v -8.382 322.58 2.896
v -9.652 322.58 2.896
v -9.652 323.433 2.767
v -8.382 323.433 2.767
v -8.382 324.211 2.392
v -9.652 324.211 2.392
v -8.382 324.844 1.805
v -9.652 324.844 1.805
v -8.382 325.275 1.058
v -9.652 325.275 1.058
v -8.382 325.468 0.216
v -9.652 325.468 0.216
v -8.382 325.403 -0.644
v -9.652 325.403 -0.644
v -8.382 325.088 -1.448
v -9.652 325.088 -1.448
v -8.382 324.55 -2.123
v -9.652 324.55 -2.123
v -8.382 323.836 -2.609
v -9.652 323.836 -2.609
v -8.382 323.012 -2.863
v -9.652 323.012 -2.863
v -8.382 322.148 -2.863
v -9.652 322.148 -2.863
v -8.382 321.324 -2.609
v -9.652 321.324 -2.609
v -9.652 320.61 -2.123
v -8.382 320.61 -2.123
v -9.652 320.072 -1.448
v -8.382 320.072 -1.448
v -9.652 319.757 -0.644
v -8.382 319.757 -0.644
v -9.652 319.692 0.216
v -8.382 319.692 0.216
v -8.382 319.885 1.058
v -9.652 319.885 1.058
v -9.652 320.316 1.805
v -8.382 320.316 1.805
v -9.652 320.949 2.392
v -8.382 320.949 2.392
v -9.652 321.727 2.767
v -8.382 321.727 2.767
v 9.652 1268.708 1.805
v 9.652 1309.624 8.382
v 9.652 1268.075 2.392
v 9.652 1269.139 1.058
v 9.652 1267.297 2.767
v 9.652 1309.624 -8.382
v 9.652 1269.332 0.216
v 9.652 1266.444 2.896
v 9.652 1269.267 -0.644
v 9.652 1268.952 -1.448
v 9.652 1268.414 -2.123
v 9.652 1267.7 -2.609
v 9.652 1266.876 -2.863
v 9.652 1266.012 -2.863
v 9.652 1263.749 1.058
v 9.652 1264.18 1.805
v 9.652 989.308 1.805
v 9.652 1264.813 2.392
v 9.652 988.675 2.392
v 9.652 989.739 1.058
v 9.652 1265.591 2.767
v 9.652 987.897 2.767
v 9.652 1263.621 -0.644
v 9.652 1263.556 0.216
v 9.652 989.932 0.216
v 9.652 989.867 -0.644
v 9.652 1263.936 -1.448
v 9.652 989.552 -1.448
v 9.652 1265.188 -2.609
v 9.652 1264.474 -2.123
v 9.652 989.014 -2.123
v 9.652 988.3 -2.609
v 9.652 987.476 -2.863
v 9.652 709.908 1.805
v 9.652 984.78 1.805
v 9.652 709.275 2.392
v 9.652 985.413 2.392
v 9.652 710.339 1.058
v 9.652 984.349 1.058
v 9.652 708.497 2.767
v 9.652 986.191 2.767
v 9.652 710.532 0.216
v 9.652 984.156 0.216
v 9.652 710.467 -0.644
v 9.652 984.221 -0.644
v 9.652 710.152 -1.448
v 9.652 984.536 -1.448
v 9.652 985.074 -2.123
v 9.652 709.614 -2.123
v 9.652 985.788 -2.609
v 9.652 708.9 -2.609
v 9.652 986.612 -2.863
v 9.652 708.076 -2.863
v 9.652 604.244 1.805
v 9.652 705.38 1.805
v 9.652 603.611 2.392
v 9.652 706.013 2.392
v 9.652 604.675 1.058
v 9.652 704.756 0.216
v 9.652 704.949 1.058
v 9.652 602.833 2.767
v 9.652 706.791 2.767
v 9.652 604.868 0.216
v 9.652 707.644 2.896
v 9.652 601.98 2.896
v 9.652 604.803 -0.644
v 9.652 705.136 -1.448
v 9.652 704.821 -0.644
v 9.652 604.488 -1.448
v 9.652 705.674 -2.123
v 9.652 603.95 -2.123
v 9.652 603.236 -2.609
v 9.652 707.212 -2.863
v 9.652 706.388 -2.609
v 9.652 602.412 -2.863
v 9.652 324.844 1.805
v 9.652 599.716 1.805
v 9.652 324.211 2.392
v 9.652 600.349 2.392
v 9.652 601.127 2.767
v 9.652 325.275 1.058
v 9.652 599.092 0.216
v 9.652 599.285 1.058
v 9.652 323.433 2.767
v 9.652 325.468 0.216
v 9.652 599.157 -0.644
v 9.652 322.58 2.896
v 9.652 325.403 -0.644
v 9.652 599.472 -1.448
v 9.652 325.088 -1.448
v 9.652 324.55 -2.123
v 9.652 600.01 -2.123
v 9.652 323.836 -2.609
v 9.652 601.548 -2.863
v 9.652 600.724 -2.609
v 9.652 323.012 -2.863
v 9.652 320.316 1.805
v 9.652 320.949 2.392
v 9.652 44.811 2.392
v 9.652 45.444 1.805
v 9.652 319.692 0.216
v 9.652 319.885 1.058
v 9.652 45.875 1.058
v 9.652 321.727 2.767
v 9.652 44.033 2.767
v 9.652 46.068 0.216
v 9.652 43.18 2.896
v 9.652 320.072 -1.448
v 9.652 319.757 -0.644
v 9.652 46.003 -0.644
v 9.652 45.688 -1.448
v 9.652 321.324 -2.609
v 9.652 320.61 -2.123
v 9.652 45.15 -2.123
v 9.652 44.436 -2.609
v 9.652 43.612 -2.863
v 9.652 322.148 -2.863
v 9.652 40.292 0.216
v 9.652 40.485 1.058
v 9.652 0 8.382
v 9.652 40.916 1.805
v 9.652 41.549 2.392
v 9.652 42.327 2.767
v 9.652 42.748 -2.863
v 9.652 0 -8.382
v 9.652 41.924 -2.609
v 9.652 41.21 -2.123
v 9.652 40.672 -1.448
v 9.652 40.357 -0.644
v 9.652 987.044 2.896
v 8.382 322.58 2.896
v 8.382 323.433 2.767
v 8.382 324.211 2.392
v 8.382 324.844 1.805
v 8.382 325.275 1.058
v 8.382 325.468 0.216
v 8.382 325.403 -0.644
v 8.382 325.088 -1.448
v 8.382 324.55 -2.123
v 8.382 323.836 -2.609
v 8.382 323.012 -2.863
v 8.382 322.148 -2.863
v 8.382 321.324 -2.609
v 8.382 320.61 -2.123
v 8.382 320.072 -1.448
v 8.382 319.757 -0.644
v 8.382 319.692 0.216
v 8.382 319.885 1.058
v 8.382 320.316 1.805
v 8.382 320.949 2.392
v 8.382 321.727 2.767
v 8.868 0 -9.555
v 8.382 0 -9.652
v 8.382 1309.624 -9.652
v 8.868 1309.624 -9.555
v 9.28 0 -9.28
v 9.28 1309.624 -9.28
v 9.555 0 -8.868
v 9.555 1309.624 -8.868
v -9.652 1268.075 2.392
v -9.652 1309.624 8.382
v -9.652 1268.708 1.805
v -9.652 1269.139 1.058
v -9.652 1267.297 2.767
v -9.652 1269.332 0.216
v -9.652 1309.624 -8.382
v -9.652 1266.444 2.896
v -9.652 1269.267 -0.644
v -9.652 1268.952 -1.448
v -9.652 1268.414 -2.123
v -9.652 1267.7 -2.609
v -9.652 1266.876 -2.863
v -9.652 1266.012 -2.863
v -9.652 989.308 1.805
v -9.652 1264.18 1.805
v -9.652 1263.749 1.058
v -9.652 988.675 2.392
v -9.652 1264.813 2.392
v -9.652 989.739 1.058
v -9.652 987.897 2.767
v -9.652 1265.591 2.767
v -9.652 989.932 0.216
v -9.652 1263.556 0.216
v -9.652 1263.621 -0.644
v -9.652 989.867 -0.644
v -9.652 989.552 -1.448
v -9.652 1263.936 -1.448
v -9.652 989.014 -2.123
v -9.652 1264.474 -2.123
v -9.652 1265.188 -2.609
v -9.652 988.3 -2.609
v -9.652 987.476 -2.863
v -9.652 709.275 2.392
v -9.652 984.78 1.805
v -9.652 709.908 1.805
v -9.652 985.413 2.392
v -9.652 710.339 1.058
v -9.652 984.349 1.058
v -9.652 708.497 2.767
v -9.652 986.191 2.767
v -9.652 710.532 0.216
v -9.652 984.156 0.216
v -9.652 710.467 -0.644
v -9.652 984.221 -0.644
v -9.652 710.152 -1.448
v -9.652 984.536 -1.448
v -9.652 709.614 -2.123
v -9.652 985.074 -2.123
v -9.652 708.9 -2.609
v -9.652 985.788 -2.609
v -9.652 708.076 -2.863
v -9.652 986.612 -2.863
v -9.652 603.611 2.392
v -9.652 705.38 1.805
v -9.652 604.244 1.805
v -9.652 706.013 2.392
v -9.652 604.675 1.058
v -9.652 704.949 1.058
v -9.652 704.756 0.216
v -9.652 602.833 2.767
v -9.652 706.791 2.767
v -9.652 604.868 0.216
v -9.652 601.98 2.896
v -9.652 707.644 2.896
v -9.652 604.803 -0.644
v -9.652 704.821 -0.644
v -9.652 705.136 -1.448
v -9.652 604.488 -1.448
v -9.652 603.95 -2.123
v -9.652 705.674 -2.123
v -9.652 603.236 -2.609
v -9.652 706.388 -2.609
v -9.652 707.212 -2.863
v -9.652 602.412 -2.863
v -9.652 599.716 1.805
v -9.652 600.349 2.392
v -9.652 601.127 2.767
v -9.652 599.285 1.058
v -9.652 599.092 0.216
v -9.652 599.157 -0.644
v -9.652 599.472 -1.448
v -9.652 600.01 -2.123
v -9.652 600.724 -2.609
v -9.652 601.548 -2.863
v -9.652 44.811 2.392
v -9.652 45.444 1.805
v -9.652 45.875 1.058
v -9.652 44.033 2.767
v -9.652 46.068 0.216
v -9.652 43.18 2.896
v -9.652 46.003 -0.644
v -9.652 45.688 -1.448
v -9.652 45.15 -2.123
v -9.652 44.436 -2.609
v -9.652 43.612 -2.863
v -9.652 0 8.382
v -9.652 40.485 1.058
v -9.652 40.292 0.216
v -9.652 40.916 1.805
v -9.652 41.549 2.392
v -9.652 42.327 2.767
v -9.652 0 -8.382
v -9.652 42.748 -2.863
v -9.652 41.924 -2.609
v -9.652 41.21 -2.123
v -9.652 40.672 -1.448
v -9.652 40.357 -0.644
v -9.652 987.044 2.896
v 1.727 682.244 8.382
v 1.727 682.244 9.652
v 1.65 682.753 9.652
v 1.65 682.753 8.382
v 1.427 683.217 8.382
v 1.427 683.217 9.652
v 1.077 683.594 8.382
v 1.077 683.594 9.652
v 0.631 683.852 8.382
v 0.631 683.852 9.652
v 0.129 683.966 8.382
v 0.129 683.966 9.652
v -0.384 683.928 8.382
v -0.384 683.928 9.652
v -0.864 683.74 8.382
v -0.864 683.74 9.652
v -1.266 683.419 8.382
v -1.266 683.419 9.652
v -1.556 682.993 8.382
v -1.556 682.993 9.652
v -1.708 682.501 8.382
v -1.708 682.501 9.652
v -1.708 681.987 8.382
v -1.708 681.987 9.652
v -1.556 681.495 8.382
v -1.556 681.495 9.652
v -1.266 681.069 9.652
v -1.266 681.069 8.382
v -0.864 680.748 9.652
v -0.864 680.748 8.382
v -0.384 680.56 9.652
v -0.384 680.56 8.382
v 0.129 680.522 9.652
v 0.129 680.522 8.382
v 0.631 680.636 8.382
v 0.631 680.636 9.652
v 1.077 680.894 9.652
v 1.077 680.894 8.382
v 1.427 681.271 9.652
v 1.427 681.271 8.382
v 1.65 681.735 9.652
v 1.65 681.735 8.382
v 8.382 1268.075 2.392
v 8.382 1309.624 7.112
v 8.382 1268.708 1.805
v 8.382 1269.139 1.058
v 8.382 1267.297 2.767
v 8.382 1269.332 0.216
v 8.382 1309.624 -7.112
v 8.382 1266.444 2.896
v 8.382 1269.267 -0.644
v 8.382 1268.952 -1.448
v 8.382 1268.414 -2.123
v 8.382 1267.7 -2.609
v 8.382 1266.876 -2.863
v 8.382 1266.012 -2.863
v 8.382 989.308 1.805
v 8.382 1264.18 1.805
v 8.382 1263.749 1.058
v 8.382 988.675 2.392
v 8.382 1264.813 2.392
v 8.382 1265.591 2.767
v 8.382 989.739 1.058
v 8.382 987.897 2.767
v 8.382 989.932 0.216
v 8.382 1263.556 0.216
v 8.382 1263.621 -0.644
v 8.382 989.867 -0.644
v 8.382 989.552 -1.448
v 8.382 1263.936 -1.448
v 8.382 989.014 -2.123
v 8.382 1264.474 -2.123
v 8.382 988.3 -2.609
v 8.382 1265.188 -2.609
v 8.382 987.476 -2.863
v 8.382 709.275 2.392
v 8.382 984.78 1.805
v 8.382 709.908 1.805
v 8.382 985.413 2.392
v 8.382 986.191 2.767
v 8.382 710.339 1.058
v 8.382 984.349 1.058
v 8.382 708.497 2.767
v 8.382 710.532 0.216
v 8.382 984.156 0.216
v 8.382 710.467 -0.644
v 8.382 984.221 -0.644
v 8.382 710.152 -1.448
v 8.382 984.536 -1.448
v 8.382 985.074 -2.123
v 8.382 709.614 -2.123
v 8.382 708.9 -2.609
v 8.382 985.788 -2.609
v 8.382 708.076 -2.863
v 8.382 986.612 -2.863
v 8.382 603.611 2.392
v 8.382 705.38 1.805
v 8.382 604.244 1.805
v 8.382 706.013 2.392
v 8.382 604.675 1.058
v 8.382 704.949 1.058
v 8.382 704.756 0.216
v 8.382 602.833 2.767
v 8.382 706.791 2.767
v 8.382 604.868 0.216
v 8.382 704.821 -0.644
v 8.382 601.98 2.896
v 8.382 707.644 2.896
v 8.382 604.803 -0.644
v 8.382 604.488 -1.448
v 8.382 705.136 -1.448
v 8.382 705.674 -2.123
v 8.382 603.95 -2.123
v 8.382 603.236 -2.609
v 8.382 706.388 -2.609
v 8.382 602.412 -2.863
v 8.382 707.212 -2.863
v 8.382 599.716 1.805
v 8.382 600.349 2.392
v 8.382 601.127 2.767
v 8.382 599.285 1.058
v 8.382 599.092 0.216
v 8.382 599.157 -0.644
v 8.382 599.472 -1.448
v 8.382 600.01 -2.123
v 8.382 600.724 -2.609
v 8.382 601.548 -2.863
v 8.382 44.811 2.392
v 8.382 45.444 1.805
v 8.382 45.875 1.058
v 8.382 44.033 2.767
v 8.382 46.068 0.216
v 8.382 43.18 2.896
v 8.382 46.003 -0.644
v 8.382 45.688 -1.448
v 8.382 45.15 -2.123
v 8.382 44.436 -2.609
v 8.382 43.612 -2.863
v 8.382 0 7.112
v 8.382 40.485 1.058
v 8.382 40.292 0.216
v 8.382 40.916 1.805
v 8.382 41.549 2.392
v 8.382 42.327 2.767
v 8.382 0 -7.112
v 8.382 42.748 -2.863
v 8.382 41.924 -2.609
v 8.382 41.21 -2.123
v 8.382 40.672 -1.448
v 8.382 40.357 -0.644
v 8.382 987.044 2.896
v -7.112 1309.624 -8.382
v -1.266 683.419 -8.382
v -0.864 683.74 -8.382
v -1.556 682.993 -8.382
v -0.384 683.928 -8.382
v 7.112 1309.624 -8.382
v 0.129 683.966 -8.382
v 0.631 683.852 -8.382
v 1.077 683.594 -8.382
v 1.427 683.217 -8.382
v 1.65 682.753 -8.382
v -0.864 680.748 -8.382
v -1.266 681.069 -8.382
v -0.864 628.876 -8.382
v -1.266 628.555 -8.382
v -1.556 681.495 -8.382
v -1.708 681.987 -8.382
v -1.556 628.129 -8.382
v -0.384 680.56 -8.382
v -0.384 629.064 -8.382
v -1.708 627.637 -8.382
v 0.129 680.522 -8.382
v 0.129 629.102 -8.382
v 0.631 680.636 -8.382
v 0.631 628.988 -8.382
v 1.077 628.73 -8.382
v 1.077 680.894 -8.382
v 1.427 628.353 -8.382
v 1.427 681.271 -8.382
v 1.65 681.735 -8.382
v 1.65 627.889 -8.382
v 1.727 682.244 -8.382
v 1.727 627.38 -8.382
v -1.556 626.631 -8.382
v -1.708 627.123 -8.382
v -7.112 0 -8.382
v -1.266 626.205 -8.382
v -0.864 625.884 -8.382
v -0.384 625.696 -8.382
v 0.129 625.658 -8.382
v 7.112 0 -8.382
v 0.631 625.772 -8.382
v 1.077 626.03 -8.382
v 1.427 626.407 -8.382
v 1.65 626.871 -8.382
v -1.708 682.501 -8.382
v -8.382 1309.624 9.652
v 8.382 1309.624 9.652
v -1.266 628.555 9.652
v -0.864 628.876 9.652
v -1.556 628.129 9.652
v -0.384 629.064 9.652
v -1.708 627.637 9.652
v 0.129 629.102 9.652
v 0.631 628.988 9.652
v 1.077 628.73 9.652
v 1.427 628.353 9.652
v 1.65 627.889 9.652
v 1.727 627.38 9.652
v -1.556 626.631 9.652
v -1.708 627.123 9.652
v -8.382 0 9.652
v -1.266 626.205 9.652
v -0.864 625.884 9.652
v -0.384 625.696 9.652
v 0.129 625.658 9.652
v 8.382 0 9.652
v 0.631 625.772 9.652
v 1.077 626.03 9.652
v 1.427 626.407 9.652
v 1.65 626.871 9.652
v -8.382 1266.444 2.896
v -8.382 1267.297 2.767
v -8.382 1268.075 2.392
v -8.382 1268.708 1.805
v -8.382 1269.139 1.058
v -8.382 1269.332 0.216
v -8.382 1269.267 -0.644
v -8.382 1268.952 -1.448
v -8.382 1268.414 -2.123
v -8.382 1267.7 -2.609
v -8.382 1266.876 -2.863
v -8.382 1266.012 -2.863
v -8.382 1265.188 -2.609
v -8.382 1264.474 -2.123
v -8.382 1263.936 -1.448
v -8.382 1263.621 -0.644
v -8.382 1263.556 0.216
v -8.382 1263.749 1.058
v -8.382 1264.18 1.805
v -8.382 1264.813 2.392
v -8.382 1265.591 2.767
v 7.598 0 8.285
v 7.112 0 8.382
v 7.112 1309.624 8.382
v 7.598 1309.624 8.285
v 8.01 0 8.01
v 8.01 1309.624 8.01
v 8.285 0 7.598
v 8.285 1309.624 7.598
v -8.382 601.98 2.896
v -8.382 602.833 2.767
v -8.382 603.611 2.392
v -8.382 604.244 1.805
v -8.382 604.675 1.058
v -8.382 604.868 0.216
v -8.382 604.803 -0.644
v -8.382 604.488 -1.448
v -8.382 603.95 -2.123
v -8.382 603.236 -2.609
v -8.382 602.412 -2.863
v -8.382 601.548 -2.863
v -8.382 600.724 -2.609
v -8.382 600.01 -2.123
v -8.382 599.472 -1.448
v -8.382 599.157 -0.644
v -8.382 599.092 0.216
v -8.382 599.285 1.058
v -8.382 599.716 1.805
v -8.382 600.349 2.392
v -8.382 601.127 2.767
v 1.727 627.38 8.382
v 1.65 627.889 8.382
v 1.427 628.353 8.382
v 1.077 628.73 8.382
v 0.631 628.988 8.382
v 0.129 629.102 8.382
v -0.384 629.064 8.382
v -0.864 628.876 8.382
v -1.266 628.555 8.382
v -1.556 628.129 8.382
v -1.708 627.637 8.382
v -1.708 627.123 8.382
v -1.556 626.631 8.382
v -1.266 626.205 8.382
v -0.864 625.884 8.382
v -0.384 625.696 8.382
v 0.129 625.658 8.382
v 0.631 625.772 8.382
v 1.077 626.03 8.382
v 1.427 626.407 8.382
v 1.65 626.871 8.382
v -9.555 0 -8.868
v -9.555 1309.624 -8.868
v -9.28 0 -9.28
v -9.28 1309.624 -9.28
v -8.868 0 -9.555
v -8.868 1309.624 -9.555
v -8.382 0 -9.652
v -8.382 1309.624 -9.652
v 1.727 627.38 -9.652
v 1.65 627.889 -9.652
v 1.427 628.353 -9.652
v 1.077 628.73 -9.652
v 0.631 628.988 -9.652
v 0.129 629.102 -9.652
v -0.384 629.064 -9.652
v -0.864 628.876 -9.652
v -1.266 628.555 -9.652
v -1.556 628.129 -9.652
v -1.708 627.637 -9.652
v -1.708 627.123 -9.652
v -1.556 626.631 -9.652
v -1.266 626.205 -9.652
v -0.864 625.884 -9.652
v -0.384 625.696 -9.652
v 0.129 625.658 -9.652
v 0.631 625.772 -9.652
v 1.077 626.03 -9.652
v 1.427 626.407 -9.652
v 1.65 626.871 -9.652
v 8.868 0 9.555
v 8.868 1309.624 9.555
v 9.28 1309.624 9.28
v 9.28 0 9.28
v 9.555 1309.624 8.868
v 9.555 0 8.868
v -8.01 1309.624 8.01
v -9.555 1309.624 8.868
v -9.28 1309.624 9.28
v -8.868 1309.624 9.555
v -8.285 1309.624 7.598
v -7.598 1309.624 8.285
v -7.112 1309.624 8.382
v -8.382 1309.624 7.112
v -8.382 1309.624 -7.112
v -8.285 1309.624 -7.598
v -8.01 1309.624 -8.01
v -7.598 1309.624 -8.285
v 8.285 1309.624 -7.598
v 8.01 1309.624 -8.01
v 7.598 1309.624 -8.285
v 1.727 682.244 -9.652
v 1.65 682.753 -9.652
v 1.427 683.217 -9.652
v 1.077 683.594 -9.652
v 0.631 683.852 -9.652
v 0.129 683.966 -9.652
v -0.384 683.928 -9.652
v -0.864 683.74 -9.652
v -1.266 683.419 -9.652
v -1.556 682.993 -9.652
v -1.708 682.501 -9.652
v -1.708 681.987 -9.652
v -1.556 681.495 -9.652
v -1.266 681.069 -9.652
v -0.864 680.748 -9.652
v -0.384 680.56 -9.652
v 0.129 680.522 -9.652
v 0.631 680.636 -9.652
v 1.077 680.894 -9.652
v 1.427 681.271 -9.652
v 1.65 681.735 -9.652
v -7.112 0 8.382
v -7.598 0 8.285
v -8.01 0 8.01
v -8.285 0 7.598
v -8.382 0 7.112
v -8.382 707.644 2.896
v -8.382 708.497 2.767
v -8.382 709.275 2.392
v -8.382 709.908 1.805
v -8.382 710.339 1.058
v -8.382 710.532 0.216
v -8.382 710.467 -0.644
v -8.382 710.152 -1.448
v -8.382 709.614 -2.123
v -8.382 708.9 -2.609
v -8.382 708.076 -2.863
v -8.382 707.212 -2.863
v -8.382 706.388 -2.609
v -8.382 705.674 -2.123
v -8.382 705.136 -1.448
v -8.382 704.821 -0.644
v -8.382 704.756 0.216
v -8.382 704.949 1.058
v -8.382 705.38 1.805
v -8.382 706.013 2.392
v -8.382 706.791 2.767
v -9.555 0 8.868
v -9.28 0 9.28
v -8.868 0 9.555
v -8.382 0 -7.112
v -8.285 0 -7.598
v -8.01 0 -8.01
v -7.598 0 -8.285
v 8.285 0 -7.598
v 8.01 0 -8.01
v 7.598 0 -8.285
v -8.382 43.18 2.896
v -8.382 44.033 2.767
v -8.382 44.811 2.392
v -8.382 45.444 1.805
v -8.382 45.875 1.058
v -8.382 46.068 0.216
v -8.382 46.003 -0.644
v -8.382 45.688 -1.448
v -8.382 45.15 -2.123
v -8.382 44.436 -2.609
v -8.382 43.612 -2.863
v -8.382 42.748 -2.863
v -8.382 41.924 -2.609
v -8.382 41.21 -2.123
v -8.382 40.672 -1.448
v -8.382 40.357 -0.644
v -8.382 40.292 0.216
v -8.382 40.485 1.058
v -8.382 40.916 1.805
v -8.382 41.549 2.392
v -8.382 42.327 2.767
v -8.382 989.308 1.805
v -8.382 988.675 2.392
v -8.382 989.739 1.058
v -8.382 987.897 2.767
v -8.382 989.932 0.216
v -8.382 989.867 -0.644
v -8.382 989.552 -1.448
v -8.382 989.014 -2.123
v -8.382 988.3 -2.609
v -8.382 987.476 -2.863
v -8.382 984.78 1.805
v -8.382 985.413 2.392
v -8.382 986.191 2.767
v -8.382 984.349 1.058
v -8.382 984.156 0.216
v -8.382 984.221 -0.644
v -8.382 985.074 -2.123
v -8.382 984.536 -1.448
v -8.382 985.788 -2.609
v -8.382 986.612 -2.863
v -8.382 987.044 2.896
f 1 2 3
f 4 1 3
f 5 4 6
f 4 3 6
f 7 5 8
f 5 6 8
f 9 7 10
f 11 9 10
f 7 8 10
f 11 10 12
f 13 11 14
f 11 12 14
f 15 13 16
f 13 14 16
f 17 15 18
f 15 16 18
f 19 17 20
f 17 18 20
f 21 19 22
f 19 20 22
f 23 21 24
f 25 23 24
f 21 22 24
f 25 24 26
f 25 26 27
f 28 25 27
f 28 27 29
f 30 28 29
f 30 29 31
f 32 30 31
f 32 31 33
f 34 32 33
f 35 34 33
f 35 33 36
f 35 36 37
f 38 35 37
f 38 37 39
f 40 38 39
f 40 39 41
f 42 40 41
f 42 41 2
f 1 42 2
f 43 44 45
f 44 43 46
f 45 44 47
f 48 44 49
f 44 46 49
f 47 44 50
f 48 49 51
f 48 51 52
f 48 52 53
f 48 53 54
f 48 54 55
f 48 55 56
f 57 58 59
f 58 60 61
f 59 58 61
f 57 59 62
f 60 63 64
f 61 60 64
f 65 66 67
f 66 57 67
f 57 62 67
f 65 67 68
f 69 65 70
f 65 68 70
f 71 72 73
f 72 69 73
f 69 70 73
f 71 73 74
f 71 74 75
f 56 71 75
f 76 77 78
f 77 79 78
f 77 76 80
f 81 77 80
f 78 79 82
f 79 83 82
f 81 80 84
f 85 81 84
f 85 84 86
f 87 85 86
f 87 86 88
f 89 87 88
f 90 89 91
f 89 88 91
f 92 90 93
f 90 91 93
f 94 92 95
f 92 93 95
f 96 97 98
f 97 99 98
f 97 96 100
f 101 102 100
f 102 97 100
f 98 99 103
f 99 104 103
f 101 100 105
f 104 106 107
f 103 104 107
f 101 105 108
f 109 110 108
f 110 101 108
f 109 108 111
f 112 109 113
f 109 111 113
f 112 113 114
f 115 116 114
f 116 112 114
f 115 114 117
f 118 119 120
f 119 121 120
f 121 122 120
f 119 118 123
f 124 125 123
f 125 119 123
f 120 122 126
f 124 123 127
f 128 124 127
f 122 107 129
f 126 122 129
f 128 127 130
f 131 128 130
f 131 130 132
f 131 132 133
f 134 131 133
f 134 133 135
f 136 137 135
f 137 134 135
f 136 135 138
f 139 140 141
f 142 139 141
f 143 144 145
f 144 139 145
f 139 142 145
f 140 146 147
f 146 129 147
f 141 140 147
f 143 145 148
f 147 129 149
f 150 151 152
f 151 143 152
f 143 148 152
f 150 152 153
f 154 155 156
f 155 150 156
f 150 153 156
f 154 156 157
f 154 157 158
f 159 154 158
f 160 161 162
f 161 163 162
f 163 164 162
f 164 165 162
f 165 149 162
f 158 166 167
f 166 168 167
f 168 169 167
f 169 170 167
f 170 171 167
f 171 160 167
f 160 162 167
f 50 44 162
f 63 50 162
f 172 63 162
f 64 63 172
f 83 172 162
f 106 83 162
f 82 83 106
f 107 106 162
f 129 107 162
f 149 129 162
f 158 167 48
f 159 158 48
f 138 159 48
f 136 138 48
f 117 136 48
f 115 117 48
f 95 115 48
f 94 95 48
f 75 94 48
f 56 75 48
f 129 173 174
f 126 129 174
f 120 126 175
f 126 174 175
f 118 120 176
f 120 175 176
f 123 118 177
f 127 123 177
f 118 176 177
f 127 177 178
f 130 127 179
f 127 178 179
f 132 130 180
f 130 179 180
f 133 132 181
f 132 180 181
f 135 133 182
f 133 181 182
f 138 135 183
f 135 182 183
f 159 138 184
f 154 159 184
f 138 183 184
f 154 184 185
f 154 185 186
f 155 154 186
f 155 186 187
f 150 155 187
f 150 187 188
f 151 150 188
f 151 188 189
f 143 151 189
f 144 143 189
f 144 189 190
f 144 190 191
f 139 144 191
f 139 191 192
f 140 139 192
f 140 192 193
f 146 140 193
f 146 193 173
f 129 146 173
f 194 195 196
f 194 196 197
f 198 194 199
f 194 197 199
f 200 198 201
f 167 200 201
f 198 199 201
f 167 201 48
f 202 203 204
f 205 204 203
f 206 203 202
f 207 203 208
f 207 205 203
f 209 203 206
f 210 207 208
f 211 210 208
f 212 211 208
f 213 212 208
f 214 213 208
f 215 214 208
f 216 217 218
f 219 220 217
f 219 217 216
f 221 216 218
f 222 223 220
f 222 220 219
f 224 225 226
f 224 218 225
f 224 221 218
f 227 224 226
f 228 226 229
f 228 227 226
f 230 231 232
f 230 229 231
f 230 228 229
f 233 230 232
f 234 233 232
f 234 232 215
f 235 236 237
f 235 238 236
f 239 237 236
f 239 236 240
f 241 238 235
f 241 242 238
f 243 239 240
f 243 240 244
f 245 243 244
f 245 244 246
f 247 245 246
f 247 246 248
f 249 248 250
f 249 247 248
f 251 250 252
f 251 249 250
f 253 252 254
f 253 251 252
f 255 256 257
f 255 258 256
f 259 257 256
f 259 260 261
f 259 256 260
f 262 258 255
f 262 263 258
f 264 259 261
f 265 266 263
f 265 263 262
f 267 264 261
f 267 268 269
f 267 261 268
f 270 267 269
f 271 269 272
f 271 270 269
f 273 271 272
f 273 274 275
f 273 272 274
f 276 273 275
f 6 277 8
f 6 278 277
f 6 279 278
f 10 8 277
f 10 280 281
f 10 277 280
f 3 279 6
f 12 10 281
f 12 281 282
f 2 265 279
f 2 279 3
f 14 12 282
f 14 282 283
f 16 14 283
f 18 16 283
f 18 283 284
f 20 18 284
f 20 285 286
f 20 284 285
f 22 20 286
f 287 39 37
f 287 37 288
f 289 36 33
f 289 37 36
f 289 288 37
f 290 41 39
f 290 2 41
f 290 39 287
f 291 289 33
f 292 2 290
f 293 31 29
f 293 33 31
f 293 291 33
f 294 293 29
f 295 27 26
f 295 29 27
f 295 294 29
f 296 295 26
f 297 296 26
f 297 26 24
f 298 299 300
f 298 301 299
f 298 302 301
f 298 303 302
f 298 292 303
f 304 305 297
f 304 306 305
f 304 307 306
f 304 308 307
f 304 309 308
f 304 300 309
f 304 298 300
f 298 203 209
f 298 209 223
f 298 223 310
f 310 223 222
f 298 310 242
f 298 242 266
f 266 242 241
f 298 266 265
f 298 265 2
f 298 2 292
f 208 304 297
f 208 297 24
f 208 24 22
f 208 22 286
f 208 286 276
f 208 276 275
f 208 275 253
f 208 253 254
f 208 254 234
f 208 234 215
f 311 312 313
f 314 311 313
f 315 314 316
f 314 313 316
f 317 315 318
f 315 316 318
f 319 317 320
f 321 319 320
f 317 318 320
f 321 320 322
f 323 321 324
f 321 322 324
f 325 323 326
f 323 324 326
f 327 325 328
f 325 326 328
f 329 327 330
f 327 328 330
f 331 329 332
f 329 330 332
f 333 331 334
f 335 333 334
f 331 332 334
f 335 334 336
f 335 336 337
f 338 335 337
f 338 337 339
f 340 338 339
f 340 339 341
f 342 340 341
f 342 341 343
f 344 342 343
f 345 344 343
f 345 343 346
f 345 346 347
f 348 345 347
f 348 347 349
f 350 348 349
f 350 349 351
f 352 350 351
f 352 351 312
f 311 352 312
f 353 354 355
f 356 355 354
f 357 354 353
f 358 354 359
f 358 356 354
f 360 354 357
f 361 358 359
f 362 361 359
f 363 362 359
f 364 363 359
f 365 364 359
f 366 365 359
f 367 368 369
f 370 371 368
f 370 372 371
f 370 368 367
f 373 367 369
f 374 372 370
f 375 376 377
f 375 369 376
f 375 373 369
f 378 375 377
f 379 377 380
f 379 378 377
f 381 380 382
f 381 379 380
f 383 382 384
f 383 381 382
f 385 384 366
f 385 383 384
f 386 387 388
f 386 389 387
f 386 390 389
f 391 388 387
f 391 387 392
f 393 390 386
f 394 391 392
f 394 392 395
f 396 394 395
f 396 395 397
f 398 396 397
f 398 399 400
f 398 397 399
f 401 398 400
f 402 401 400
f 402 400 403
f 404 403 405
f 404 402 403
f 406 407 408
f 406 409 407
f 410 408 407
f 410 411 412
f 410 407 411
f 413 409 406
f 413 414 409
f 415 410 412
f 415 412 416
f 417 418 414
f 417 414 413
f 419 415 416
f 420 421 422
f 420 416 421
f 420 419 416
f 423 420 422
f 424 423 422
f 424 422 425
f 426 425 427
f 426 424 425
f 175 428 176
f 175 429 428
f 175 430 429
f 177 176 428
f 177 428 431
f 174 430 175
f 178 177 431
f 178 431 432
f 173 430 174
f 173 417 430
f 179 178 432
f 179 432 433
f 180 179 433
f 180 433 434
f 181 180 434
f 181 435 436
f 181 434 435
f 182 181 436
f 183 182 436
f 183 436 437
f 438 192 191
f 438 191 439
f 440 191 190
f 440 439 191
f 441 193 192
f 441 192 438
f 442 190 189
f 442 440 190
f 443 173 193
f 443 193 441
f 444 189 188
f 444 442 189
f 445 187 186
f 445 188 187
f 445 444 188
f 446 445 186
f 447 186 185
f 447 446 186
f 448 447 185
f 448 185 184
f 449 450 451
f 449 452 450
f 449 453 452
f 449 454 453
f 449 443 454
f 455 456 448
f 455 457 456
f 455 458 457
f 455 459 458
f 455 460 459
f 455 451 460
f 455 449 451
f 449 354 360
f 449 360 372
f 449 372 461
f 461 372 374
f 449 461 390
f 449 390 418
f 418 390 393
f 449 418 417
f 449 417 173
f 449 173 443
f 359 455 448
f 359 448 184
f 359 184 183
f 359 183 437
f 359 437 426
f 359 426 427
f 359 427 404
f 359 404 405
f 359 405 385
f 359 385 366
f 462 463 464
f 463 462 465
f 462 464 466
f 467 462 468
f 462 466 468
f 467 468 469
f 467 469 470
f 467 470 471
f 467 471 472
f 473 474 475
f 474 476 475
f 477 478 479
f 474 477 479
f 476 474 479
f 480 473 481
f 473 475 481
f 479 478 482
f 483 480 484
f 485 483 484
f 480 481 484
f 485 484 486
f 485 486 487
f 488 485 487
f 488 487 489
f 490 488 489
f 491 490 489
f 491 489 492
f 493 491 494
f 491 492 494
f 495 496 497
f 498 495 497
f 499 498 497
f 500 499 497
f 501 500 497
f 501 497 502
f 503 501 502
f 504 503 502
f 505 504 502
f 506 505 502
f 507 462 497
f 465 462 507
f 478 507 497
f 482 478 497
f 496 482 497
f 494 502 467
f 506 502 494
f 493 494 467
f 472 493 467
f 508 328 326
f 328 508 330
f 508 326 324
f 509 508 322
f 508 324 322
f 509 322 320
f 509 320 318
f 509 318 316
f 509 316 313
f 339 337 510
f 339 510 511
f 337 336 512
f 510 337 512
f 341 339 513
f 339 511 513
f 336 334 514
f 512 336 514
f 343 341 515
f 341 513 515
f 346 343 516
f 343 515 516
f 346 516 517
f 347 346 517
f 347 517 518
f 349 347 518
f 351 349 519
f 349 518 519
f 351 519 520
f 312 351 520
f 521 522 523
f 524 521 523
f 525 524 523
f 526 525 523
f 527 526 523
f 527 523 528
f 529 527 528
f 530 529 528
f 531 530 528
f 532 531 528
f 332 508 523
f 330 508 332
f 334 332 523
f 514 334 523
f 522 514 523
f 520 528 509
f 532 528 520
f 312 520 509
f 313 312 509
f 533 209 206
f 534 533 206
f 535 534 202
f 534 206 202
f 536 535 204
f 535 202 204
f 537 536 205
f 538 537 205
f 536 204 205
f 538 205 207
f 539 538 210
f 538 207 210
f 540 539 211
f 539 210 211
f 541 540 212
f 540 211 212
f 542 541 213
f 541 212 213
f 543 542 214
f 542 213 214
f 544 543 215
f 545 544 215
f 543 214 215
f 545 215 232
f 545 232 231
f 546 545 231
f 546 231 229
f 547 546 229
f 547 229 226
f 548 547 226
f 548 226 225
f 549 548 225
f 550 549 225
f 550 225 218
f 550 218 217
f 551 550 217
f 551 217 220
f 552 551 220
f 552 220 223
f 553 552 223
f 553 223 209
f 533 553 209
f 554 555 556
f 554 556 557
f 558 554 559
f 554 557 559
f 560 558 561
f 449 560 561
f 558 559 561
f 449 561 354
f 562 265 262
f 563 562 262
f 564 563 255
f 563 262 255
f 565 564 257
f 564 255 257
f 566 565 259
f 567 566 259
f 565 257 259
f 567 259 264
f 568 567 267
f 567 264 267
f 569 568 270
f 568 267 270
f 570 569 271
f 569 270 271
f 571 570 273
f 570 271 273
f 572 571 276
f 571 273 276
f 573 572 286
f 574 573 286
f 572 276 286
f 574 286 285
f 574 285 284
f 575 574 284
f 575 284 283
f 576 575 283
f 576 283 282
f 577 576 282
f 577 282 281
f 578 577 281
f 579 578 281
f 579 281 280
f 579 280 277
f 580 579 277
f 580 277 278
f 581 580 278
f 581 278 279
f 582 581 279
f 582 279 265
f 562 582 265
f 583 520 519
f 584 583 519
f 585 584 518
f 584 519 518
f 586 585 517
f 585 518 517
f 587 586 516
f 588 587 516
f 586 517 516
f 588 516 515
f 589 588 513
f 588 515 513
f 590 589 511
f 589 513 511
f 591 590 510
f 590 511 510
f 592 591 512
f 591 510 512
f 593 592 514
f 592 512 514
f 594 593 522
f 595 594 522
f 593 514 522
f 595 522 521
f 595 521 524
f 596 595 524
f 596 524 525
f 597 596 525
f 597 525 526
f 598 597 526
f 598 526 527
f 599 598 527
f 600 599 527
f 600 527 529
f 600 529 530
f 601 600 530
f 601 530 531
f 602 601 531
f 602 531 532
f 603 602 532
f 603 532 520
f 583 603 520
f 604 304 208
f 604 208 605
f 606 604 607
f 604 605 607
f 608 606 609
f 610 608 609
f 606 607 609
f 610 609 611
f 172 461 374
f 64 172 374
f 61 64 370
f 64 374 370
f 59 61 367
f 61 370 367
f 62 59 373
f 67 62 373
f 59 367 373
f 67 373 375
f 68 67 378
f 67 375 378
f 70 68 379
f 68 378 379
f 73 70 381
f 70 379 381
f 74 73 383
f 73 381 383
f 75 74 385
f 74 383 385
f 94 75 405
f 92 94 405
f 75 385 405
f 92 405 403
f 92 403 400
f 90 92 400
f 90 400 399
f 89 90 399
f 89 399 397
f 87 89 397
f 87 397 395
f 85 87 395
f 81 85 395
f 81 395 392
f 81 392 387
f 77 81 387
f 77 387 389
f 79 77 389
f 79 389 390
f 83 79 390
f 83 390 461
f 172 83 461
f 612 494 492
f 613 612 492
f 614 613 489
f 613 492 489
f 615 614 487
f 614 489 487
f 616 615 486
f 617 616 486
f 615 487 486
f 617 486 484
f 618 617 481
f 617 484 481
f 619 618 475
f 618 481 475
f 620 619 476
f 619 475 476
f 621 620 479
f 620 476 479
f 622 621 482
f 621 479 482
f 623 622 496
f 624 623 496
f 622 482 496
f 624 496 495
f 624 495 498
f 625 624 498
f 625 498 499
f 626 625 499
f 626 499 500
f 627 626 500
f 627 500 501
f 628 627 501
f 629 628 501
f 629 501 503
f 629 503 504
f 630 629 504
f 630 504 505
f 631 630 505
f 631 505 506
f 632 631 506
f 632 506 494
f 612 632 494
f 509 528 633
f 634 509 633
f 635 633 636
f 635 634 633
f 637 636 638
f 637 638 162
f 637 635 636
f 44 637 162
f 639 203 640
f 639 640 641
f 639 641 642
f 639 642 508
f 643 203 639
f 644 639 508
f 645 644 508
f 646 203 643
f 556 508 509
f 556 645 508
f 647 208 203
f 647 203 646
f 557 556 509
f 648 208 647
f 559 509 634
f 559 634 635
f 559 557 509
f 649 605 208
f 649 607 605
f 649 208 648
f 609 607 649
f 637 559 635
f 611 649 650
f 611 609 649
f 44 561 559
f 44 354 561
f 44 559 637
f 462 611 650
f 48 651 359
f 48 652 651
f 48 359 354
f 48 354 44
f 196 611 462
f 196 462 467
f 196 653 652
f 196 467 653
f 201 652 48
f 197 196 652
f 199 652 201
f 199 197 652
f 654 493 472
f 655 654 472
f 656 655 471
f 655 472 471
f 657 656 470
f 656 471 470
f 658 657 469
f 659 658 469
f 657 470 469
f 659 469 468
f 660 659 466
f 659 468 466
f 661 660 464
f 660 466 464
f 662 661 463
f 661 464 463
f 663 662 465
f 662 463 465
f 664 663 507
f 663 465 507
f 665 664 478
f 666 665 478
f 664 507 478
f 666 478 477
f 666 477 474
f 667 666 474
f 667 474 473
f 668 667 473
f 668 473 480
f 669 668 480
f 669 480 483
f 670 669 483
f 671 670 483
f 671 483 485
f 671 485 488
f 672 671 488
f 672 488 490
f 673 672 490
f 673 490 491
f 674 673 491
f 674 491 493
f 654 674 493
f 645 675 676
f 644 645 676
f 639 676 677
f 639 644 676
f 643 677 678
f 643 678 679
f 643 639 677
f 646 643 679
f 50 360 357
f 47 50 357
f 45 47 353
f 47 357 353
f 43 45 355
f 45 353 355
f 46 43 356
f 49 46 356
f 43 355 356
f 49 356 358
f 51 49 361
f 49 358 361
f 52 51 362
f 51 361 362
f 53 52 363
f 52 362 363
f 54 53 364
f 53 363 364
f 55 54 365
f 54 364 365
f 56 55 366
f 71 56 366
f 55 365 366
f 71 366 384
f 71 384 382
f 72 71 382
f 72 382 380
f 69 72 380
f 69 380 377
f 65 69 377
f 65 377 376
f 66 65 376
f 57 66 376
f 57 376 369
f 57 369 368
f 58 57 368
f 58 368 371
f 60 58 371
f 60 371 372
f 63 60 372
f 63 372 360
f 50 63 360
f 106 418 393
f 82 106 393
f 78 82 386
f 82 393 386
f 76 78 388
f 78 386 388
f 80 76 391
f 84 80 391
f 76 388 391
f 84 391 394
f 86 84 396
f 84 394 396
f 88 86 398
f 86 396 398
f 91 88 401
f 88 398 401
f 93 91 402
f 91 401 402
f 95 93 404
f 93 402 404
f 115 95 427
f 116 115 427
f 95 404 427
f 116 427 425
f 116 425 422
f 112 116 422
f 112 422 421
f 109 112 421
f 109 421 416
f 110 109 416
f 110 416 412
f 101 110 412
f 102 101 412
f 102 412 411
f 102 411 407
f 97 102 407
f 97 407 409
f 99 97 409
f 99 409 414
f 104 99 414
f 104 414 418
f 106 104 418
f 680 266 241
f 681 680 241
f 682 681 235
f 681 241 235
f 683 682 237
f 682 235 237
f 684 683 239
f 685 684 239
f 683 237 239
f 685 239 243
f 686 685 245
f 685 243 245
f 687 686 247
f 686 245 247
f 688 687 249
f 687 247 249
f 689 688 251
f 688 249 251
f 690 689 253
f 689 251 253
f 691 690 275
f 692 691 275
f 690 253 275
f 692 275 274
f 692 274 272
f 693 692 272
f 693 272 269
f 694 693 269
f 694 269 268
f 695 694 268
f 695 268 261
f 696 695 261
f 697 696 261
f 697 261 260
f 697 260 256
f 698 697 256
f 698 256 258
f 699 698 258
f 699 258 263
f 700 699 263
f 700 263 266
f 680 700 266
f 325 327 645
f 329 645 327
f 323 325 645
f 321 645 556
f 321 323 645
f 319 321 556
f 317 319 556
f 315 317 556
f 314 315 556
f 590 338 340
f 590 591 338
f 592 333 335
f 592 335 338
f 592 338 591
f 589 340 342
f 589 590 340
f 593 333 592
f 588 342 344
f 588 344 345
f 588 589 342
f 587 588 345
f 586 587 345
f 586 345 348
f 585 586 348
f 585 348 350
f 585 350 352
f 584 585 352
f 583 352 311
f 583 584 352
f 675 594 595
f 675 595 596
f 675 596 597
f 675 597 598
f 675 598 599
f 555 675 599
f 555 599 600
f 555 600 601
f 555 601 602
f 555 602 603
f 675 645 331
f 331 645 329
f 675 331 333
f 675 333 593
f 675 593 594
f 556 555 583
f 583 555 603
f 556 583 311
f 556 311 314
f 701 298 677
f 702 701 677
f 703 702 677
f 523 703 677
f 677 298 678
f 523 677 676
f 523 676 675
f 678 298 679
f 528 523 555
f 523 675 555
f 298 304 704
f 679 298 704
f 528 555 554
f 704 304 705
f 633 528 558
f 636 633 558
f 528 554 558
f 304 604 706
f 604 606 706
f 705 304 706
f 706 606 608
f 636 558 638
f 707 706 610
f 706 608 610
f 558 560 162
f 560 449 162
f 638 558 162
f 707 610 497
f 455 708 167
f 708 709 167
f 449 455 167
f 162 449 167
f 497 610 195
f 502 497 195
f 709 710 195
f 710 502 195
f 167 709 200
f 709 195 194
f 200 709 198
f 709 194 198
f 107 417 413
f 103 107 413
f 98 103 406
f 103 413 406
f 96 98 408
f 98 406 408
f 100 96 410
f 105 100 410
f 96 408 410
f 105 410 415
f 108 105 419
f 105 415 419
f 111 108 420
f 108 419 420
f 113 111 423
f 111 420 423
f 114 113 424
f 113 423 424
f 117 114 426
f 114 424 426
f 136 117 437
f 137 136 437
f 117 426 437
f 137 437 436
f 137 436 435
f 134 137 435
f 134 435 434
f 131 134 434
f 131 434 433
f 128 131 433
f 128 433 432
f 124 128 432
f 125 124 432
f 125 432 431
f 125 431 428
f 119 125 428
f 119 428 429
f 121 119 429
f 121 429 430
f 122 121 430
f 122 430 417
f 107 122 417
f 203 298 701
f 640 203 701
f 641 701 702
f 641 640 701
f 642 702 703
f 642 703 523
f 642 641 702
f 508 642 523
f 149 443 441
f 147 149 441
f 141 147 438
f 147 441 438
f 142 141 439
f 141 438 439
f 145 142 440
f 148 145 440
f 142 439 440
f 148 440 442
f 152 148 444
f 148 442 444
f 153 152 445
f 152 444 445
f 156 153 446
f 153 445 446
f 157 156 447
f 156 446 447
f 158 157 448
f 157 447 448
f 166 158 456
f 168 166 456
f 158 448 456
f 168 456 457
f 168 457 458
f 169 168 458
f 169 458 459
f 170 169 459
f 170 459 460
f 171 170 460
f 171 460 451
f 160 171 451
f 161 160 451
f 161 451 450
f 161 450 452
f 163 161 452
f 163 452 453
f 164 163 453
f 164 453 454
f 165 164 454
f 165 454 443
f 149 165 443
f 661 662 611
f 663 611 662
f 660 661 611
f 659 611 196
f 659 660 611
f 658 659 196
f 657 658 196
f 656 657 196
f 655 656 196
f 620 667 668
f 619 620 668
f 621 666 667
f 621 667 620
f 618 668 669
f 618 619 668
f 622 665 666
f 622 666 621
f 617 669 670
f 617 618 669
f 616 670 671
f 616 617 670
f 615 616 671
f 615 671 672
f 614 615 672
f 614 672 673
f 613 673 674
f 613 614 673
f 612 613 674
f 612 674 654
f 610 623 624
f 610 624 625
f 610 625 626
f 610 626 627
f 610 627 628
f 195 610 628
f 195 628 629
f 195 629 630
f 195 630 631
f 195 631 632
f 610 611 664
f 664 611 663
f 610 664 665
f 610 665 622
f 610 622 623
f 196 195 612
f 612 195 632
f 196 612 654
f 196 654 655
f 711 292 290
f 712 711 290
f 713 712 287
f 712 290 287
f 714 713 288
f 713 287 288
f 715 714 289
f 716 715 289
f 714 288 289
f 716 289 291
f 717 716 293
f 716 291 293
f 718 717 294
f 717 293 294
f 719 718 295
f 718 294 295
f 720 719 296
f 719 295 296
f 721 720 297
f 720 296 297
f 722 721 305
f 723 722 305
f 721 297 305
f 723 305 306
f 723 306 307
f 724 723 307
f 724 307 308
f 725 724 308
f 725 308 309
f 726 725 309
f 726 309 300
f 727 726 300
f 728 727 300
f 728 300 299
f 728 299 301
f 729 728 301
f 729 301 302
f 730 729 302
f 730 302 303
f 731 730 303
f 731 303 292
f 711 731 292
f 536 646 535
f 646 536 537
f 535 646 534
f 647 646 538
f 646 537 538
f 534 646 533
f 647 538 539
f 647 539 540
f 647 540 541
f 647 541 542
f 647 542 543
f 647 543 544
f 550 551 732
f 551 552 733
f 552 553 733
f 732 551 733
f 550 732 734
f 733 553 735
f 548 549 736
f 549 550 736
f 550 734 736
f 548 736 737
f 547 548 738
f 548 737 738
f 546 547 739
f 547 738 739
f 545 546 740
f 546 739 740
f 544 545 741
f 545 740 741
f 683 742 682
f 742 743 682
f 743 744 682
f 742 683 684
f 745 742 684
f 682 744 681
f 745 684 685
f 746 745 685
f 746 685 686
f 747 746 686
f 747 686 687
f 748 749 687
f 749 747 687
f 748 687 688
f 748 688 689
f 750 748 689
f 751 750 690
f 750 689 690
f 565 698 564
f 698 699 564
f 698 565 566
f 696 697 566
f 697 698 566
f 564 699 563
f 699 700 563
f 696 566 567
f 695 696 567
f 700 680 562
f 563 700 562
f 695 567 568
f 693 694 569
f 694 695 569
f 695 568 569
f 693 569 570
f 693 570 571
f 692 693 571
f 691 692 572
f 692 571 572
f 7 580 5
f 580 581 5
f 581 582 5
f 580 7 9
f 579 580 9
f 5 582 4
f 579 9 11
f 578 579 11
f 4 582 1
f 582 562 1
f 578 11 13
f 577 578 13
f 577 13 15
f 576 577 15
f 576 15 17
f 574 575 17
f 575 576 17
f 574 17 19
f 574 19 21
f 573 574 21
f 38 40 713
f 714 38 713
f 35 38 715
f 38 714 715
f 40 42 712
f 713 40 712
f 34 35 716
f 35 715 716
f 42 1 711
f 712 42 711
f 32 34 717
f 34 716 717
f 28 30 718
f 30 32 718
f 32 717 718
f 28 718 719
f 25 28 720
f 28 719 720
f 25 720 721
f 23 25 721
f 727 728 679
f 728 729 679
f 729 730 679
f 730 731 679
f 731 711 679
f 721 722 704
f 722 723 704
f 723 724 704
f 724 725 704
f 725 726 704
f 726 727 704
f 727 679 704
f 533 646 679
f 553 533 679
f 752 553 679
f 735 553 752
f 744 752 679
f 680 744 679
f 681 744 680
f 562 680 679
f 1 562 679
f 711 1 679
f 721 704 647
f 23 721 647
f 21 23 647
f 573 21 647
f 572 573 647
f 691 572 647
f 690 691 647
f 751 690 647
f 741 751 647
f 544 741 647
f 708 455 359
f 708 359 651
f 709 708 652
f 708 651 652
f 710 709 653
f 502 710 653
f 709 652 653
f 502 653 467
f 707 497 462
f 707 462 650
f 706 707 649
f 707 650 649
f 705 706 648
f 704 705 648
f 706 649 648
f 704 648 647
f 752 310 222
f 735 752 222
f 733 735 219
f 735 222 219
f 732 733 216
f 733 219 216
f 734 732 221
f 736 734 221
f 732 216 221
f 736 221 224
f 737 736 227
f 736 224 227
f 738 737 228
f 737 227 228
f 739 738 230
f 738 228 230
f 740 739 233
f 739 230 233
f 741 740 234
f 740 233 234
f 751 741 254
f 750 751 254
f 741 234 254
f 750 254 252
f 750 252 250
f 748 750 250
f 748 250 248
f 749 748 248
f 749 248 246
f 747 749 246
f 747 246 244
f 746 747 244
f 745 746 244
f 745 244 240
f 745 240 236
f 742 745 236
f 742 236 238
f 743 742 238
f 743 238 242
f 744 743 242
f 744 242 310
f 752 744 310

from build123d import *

# Parameters (mm, degrees)
SKETCH1_W                  = 19.304
SKETCH1_H                  = 19.304
SKETCH1_W_2                = 16.764
SKETCH1_H_2                = 16.764
BOSS_EXTRUDE1_DEPTH        = 1309.624
FILLET1_R                  = 1.27
F_1_0_228_DIAMETER_HOLE1_D = 5.7912
F_8_32_TAPPED_HOLE1_D      = 3.4544


with BuildPart() as part:
    # Sketch1 → Boss-Extrude1 (new body)
    with BuildSketch(Plane(origin=(0, 0, 0), x_dir=(1, 0, 0), z_dir=(0, 1, 0))):
        Rectangle(SKETCH1_W, SKETCH1_H)
        Rectangle(SKETCH1_W_2, SKETCH1_H_2, mode=Mode.SUBTRACT)
    extrude(amount=BOSS_EXTRUDE1_DEPTH)

    # Fillet1
    fillet1_edges = [part.edges().sort_by_distance(p)[0] for p in [
        (-8.382, 654.812, 8.382),
        (8.382, 654.812, 8.382),
        (8.382, 654.812, -8.382),
        (-8.382, 654.812, -8.382),
        (9.652, 654.812, 9.652),
        (-9.652, 654.812, 9.652),
        (-9.652, 654.812, -9.652),
        (9.652, 654.812, -9.652),
    ]]
    fillet(fillet1_edges, radius=FILLET1_R)

    # #1 (0.228) Diameter Hole1 (through all)
    with Locations(Plane(origin=(9.652, 0, 0), x_dir=(0, 0, -1), z_dir=(1, 0, 0))):
        with Locations((0, 601.98), (0, 1266.444), (0, 987.044), (0, 707.644), (0, 43.18), (0, 322.58)):
            Hole(F_1_0_228_DIAMETER_HOLE1_D / 2)

    # #8-32 Tapped Hole1 (through all)
    with Locations(Plane(origin=(0, 0, -9.652), x_dir=(-1, 0, 0), z_dir=(0, 0, -1))):
        with Locations((0, 627.38), (0, 682.244)):
            Hole(F_8_32_TAPPED_HOLE1_D / 2)


solid = part.part
